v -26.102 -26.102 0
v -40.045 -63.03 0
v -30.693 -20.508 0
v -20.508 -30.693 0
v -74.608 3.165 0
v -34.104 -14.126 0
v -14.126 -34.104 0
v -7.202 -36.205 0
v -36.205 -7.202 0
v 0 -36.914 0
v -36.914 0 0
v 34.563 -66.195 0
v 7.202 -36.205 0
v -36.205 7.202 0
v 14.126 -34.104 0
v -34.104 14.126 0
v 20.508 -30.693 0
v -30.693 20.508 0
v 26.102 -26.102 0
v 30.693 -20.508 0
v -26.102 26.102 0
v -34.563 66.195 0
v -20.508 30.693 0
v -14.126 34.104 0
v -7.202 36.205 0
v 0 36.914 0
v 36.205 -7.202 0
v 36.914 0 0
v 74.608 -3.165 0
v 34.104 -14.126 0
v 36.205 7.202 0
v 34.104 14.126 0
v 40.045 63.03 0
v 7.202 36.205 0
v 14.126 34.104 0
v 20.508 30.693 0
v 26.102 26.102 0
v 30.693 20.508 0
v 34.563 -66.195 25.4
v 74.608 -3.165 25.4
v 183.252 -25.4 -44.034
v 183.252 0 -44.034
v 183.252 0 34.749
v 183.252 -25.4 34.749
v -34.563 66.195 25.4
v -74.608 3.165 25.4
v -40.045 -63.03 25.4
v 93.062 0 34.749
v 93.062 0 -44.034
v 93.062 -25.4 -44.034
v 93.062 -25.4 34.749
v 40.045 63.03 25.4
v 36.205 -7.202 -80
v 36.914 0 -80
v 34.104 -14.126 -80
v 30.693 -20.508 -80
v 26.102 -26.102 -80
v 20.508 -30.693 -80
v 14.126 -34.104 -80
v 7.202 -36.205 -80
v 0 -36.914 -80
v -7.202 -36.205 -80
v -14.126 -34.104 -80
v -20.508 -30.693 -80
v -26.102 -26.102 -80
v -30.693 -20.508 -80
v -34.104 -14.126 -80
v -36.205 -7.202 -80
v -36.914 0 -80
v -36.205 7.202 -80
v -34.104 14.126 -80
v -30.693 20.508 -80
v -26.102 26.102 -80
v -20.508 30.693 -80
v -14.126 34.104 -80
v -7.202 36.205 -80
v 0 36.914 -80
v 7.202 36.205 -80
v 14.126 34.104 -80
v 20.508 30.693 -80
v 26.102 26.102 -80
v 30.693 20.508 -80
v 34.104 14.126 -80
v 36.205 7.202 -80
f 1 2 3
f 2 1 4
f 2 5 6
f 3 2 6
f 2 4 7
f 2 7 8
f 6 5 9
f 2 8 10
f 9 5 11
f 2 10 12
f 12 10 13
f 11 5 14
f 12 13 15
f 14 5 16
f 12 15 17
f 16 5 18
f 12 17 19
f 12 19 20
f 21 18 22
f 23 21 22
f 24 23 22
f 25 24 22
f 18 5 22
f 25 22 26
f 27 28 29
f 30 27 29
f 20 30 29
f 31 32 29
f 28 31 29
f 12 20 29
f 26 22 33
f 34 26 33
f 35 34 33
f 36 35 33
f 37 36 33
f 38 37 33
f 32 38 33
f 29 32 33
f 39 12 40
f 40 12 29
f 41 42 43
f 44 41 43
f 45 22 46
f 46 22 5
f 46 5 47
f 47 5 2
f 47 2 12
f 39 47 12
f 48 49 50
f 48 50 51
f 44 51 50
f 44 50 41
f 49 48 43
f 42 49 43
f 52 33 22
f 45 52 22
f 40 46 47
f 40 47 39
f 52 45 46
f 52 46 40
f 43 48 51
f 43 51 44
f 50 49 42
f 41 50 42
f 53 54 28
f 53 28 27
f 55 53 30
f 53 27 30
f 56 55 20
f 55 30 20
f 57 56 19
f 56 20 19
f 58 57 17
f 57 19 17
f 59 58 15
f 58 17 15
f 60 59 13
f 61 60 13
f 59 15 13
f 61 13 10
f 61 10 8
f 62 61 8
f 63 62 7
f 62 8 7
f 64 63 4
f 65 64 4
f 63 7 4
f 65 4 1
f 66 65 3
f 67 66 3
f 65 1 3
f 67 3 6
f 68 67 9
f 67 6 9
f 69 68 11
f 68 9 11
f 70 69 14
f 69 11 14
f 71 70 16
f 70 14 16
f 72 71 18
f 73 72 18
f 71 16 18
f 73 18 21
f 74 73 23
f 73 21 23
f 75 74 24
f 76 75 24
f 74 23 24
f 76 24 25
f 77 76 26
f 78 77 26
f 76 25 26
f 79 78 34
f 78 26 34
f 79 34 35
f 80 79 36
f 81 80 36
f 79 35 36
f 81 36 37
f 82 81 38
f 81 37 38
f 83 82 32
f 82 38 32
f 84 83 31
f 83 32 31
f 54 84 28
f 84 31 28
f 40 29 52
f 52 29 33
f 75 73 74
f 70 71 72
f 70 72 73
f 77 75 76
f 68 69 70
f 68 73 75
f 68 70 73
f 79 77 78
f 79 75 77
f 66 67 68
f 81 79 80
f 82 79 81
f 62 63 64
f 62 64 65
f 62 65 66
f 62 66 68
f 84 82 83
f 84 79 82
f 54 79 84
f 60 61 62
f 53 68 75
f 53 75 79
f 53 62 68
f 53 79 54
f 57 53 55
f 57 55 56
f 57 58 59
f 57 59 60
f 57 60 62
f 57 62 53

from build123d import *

# Parameters (mm, degrees)
F1_DEPTH = 25.4
F2_R     = 36.913849
F3_DEPTH = 80
F4_W     = 90.19012
F4_H     = 78.783322
F5_DEPTH = 25.4


with BuildPart() as f1:
    # F0 (on Top) → F1 (new body)
    with BuildSketch(Plane.XY):
        Polygon((74.608094, -3.165196), (40.045187, 63.029907), (-34.562907, 66.195103), (-74.608094, 3.165196), (-40.045187, -63.029907), (34.562907, -66.195103), align=None)
    extrude(amount=F1_DEPTH)

    # F2 (on face) → F3 (join)
    with BuildSketch(Plane(origin=(0, 0, 0), x_dir=(1, 0, 0), z_dir=(0, 0, -1))):
        Circle(F2_R)
    extrude(amount=F3_DEPTH)


with BuildPart() as f5:
    # F4 (on Front) → F5 (new body)
    with BuildSketch(Plane.XZ):
        with Locations((138.156857, -4.642328)):
            Rectangle(F4_W, F4_H)
    extrude(amount=F5_DEPTH)


solid = Compound([f1.part, f5.part])
